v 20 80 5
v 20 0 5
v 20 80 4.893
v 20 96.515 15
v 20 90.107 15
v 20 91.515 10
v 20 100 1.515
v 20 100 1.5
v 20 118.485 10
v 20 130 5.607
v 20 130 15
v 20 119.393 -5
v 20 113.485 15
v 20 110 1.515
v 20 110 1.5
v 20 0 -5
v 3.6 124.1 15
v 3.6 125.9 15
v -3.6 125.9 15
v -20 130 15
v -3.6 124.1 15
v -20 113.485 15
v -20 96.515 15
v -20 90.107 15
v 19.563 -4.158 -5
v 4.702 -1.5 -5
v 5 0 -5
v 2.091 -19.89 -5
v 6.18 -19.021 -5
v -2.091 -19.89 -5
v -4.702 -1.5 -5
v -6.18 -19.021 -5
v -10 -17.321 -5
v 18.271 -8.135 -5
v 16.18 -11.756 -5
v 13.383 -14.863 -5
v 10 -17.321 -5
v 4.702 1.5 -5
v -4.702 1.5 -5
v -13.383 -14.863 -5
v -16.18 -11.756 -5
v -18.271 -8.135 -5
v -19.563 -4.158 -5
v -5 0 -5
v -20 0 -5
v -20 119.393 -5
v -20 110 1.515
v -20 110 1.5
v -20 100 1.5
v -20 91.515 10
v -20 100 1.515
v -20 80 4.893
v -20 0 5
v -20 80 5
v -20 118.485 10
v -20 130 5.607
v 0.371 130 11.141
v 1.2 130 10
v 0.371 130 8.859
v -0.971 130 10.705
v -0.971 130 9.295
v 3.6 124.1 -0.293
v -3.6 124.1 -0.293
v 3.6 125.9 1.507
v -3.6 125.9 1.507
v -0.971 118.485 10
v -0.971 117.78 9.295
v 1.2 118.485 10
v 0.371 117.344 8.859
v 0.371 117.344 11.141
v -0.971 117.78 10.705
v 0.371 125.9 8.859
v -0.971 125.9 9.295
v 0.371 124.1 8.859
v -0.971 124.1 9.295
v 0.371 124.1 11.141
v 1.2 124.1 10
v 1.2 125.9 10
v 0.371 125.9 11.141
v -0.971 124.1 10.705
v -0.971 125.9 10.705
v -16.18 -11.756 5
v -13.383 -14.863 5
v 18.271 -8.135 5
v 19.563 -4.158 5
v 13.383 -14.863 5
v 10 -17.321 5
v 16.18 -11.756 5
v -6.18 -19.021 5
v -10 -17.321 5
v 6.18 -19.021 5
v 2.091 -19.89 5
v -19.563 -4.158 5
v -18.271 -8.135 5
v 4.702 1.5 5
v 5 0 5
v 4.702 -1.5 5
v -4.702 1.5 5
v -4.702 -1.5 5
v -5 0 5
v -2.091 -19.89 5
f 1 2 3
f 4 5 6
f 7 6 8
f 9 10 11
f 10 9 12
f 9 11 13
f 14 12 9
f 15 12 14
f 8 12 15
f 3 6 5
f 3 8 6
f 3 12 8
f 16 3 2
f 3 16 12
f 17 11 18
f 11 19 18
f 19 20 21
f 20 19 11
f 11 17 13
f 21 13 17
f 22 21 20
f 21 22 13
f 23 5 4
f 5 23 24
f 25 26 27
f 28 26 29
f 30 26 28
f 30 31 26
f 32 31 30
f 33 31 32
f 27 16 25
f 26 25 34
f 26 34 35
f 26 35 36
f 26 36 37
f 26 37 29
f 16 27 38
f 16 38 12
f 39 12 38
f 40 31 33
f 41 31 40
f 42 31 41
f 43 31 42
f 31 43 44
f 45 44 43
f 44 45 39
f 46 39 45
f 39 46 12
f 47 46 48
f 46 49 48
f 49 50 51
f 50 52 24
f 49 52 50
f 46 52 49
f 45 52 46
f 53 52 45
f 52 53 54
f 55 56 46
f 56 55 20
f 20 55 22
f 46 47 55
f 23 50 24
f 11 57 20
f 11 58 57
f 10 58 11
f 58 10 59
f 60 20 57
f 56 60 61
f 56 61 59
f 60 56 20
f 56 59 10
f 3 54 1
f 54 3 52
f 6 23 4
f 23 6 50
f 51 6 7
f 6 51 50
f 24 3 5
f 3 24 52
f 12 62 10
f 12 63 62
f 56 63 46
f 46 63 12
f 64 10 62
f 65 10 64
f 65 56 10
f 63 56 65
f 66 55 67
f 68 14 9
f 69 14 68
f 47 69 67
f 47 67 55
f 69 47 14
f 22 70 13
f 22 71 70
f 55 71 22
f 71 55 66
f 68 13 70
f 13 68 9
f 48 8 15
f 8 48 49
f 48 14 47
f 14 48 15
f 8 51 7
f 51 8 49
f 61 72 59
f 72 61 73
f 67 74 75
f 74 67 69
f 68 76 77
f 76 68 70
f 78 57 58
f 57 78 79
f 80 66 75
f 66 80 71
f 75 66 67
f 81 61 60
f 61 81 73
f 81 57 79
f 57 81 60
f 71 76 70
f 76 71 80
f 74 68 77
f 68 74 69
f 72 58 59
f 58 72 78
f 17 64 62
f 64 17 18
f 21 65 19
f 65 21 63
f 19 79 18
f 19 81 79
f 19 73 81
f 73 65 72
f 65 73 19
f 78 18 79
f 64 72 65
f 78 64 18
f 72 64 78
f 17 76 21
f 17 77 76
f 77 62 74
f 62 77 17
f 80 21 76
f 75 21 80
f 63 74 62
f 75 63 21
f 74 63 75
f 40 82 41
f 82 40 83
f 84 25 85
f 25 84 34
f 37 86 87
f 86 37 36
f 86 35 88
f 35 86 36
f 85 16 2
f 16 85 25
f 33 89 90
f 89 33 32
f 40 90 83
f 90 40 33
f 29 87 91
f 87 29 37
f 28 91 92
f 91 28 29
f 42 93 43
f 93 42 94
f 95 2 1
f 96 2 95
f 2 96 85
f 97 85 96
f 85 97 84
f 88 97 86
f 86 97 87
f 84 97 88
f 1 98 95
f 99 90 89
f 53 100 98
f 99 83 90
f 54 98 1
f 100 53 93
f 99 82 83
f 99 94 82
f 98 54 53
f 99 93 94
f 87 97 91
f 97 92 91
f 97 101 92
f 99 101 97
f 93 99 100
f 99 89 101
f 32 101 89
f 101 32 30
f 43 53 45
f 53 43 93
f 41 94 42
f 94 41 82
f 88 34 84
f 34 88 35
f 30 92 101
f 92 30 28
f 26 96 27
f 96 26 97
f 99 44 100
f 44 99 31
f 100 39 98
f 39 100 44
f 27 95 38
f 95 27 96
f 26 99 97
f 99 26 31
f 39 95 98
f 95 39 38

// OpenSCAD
mm = 1;
scd=1.2*mm;//screw radius
part_thickness = 10*mm;
hl = 80*mm; //handle length

module part(){
    union(){
        //base disc
        cylinder(h=10*mm, r=20*mm, center=true);
        //handle
        translate([0,hl/2,0]) cube([40*mm,hl,10*mm], center=true);
        
        difference(){
            //main body of the grip
            translate([0,hl+25,5*mm]) cube([40*mm,50*mm,20*mm], center=true);
            
            //cradle to hold the pen in place
            translate([0,hl+20,10*mm]) rotate(45, [1,0,0]) cube([80*mm,12*mm,12*mm], center=true);
            
            //beveling cubes for the grip
            translate([0,hl,15.5*mm]) rotate(45, [1,0,0]) cube([80*mm,15*mm,15*mm], center=true);
            translate([0,hl+50,-5*mm]) rotate(45, [1,0,0]) cube([80*mm,15*mm,15*mm], center=true);
            
            //symetry of the cradle
            translate([0,hl+30,10*mm]) rotate(45, [1,0,0]) cube([80*mm,12*mm,12*mm], center=true);
            
            //join between the two cradles
            translate([0,hl+25,13*mm]) cube([80*mm,10*mm,23*mm], center=true);
            
            //screw hole
            translate([0,hl+80,10*mm]) rotate(90,[1,0,0]) cylinder(h=60*mm,r=scd);
            
            //nut holding slot
            translate([0,hl+45,10*mm]) cube([scd*6,scd*1.5,100],center=true);
        }
    }
}

module axis_1(){//28BYJ-48-08 stepper axis
    intersection(){
        rotate(180, [1,0,0]) cylinder(h=part_thickness*2,r=5*mm, center=true);
        rotate(90, [1,0,0]) cube([part_thickness+10*mm, part_thickness+10*mm, 3*mm], center=true);
    }
}

module handle(){
    difference(){
        part();
        axis_1();
    }
}

handle();
